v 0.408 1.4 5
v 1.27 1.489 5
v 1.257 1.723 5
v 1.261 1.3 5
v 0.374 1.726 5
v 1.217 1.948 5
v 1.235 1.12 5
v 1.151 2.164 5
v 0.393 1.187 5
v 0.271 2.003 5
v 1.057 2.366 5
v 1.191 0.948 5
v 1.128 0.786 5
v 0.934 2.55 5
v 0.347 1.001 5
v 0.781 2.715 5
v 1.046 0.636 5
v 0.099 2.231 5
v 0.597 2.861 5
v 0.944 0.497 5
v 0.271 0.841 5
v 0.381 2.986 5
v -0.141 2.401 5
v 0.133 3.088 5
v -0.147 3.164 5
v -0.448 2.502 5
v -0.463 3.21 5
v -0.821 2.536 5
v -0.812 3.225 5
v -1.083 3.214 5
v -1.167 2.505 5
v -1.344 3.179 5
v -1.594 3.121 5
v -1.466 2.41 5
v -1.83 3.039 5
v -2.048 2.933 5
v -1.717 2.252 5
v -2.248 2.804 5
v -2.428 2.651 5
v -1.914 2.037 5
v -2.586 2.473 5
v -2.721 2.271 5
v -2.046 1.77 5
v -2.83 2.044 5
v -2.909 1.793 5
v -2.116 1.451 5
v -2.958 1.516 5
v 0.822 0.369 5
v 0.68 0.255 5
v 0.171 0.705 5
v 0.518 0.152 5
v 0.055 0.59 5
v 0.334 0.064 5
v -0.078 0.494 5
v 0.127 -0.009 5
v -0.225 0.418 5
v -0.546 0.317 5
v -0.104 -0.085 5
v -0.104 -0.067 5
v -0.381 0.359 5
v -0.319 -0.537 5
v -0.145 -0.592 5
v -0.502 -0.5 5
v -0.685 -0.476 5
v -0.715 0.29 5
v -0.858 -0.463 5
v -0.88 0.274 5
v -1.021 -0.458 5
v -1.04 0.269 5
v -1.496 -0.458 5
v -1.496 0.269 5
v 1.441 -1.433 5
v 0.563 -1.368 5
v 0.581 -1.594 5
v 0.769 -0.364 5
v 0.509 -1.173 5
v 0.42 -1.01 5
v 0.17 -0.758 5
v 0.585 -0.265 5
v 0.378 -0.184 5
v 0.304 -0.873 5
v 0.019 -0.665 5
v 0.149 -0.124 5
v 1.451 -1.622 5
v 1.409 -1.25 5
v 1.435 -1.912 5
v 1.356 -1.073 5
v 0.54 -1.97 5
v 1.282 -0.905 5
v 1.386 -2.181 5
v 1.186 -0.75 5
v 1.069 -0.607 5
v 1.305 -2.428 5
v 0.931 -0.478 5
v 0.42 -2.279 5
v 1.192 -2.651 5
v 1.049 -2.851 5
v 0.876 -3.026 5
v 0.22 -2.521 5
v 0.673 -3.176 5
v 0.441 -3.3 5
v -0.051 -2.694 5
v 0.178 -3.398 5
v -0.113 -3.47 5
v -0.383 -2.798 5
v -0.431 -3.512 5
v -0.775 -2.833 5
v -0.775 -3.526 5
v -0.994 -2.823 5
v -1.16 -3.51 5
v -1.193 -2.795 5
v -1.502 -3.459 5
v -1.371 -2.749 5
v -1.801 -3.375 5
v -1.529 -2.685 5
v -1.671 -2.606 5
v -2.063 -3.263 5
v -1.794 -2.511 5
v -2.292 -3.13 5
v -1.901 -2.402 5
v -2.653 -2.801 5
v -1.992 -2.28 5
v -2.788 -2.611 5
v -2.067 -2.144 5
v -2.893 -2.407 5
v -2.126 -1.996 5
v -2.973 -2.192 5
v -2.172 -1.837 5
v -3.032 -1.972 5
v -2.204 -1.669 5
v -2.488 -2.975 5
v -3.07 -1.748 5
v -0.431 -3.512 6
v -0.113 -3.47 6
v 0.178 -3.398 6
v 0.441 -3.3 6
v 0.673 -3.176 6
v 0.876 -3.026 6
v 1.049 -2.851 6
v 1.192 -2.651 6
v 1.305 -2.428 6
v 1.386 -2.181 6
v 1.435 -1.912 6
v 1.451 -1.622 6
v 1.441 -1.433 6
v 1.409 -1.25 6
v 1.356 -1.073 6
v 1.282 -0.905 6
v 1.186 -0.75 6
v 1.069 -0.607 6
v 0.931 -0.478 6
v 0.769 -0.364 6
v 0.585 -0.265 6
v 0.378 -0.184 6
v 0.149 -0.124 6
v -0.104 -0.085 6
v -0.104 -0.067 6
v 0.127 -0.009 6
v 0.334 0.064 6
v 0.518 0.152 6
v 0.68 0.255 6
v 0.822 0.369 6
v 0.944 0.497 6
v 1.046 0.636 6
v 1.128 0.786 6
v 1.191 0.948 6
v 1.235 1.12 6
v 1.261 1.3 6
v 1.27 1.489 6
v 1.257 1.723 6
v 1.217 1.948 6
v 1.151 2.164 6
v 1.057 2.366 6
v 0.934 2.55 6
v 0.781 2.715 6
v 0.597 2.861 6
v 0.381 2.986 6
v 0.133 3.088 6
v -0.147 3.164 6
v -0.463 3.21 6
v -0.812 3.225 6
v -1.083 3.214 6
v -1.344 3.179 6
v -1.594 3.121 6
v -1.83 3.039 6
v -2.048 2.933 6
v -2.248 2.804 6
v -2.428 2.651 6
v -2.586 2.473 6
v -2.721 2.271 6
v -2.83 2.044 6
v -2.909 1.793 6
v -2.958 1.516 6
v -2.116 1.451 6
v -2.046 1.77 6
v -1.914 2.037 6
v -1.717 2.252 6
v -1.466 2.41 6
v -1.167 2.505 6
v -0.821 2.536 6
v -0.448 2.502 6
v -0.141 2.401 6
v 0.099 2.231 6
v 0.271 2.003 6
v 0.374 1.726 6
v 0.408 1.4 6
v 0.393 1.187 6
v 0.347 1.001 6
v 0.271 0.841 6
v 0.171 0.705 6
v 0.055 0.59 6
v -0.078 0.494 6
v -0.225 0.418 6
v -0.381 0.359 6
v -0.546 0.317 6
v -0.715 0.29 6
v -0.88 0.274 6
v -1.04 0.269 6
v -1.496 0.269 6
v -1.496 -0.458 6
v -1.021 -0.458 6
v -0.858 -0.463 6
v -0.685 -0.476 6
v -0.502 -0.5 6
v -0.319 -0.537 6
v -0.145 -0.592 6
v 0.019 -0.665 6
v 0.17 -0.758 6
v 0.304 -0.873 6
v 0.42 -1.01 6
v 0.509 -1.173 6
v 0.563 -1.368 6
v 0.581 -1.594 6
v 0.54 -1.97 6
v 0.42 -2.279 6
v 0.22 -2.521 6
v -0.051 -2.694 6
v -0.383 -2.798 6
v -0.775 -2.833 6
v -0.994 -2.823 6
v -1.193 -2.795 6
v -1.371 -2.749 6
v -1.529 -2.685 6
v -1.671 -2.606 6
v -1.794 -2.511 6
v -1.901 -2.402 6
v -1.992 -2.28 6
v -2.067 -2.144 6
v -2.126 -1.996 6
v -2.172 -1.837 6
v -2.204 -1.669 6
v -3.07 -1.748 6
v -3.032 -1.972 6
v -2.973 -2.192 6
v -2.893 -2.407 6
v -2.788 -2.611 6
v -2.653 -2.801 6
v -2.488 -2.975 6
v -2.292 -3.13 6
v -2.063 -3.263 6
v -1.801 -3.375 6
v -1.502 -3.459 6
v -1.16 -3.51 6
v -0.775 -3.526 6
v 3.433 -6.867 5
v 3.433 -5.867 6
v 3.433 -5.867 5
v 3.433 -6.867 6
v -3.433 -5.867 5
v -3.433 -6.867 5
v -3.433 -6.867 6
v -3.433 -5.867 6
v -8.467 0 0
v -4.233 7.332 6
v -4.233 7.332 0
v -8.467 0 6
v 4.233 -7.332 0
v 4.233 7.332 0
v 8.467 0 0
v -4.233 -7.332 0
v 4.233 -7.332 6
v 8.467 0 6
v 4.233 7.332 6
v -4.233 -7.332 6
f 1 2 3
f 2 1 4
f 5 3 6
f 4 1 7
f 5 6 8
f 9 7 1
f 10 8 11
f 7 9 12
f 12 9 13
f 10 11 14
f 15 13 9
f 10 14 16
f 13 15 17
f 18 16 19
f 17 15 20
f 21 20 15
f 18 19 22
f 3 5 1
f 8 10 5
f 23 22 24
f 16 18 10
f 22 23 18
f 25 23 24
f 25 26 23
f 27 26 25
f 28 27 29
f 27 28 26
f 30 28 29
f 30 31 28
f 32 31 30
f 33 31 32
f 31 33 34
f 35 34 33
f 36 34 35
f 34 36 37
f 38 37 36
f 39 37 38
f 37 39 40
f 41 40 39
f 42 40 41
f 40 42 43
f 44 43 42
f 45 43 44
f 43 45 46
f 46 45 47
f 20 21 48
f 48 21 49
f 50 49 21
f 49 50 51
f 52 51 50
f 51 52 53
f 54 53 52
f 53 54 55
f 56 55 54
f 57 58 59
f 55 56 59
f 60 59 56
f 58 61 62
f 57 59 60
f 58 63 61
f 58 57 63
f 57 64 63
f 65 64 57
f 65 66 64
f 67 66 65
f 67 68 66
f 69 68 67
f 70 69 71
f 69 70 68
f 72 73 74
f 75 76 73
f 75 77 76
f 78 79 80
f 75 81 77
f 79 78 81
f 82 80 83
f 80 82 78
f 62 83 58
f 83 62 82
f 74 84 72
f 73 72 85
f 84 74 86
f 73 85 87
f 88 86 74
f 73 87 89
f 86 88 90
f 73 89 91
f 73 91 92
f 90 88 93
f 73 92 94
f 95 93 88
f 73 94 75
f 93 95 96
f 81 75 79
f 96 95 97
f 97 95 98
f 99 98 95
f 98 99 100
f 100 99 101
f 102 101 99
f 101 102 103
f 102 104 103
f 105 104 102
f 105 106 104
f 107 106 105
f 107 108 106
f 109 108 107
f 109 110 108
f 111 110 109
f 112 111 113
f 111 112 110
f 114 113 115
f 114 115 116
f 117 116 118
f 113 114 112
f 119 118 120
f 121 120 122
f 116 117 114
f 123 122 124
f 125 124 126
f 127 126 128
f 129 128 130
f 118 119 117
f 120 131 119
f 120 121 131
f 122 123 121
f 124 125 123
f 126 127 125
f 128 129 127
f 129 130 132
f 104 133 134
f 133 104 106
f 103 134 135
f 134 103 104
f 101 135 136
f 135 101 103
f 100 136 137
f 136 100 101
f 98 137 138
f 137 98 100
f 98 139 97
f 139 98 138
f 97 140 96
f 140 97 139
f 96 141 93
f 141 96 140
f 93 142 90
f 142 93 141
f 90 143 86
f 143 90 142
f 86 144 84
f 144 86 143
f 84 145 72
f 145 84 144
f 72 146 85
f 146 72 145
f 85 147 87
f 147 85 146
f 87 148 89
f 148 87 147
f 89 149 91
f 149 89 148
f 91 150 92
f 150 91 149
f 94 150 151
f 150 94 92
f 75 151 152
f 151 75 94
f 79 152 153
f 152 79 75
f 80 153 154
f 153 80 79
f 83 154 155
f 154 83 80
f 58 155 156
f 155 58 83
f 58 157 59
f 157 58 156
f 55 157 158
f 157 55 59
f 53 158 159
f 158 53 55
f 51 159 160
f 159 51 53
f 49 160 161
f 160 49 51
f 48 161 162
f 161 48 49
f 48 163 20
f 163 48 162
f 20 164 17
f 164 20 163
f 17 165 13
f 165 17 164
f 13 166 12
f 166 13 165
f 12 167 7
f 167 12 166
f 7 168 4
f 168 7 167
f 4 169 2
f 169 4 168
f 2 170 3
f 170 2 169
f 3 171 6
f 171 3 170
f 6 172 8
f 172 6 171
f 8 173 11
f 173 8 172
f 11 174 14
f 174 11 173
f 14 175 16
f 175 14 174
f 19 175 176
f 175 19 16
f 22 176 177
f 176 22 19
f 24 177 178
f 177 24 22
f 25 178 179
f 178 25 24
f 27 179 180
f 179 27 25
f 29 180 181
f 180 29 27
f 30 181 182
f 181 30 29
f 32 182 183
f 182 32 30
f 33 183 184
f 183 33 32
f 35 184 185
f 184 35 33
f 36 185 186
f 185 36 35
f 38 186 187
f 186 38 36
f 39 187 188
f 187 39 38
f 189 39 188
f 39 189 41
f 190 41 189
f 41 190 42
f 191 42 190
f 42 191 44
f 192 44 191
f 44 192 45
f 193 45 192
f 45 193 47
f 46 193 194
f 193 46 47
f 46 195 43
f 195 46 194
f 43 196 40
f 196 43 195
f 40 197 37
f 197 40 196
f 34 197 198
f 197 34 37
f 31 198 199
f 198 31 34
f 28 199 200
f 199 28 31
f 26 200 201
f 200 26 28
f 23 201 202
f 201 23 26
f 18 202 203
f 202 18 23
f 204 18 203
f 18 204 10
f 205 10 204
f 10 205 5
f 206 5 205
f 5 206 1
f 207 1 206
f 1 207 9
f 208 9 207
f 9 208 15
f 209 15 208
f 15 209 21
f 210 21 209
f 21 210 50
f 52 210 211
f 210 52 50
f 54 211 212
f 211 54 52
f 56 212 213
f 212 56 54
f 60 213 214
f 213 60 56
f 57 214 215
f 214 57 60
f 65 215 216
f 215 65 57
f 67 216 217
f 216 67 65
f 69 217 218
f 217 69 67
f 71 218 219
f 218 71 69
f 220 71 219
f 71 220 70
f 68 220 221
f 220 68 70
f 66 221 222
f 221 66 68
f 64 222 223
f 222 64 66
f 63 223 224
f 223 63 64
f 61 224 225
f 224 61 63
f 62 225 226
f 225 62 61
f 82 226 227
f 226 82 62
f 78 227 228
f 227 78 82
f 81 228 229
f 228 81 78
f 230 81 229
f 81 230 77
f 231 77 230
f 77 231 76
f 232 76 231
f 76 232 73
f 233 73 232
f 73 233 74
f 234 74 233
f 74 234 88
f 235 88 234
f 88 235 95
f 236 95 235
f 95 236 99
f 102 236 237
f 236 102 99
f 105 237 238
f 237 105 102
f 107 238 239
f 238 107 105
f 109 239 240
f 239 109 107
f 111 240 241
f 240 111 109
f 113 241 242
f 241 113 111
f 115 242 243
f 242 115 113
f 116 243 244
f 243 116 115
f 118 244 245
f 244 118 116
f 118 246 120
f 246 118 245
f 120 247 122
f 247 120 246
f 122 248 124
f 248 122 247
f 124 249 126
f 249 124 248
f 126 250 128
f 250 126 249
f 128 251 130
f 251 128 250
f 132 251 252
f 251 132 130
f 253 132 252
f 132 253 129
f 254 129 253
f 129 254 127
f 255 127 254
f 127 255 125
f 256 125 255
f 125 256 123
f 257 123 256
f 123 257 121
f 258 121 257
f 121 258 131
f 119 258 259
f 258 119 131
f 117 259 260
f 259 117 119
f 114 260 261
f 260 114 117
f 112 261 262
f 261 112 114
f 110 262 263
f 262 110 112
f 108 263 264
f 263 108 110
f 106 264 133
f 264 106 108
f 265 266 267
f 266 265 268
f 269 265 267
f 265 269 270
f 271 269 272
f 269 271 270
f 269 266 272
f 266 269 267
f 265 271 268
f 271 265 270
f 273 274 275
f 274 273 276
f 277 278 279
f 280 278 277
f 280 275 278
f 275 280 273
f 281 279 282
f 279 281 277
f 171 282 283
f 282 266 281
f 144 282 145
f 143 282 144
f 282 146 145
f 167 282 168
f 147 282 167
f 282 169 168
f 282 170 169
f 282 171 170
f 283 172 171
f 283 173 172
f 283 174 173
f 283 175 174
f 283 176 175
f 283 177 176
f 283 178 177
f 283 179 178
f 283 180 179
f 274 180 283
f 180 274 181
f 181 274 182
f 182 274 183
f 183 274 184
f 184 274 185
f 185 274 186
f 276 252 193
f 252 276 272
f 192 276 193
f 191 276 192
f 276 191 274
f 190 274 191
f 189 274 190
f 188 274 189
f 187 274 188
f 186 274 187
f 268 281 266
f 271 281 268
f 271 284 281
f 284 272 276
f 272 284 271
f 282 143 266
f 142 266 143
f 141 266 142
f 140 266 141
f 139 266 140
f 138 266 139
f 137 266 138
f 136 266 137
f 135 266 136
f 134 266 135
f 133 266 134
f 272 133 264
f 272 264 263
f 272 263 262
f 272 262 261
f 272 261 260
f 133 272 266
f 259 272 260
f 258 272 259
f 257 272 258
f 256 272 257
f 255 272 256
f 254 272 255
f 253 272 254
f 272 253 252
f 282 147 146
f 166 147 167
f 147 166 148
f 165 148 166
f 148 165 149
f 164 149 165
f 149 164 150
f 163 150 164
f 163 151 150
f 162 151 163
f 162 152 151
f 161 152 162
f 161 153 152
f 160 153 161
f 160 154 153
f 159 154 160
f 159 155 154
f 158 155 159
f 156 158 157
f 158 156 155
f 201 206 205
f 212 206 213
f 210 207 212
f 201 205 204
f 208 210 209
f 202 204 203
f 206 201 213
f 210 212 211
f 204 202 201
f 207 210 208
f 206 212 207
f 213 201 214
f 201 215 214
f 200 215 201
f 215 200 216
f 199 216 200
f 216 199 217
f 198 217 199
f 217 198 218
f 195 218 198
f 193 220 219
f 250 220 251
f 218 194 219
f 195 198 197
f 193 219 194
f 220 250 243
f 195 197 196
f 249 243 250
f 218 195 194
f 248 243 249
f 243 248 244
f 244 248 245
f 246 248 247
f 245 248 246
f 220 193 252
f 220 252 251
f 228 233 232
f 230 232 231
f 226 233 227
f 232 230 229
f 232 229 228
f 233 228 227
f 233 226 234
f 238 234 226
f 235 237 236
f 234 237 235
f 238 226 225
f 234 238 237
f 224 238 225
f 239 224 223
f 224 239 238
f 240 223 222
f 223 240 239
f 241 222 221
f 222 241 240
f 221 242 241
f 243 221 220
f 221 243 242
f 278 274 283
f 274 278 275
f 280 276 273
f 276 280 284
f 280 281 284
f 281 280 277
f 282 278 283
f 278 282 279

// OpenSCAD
// file: ../library/calculate.scad
module inlay(depth)
{
    difference()
    {
        children(0);
        translate([ 0, 0, depth ]) children([1:$children - 1]);
    }
}
// file: ../library/variables.scad
// Variables

die_width = 12;
double_digit_placement = 1; // 0.7 for 8mm, 1 for 12mm

wiggle_width = 0.2;
separator = 1.6;
base_plate_sides = 5;
token_sides = 6;
slot_height = 1;

// Calculations

height = die_width / 2;

die_slot_width = die_width + wiggle_width;
die_slot_y = -1 * ((die_slot_width / 2) + separator);
die_slot_right_x = (die_slot_width / 2) + separator;
die_slot_left_x = -1 * (die_slot_width / 2) - separator;

base_plate_size = (die_slot_width * 2) + separator;
inset_width = base_plate_size - separator;
inset_depth = height - separator;

shallow_slot_height = (height - inset_depth) / 2;

token_slot_width = base_plate_size / 3;
token_width = token_slot_width - wiggle_width;
token_height = height;
token_slot_y = (die_slot_width / 2) + (separator * 2);
token_inset_height = token_height - 1;
token_doubledigit_font_size = token_width - separator;

token_poison_width = (token_width / 3);
token_poison_placement = (token_width / 3);
// file: ../library/tokens.scad
include <variables.scad>
include <calculate.scad>

module token_base()
{
    linear_extrude(token_height) circle(token_width, $fn = token_sides);
}

module token_doubledigit_number(num) 
{
    inlay(depth = token_inset_height) 
    {
        token_base();
        translate([-1 * token_doubledigit_font_size + double_digit_placement, -1 * token_doubledigit_font_size / 2, 0]) linear_extrude(token_height) text(text = num, size = token_doubledigit_font_size);
        translate([-1 * token_doubledigit_font_size / 2, -1 * token_doubledigit_font_size, 0]) cube([token_doubledigit_font_size, 1, 2]);
    }
}

module token_singledigit_number(num) 
{ 
    inlay(depth = token_inset_height) 
    {
        token_base();
        translate([-1 * (token_doubledigit_font_size / 2), -1 * token_doubledigit_font_size / 2, 0]) linear_extrude(token_height) text(text = num, size = token_doubledigit_font_size);
        translate([-1 * token_doubledigit_font_size / 2, -1 * token_doubledigit_font_size, 0]) cube([token_doubledigit_font_size, 1, 2]);
    }
}
// main file
include <../library/tokens.scad>

token_singledigit_number("3");
